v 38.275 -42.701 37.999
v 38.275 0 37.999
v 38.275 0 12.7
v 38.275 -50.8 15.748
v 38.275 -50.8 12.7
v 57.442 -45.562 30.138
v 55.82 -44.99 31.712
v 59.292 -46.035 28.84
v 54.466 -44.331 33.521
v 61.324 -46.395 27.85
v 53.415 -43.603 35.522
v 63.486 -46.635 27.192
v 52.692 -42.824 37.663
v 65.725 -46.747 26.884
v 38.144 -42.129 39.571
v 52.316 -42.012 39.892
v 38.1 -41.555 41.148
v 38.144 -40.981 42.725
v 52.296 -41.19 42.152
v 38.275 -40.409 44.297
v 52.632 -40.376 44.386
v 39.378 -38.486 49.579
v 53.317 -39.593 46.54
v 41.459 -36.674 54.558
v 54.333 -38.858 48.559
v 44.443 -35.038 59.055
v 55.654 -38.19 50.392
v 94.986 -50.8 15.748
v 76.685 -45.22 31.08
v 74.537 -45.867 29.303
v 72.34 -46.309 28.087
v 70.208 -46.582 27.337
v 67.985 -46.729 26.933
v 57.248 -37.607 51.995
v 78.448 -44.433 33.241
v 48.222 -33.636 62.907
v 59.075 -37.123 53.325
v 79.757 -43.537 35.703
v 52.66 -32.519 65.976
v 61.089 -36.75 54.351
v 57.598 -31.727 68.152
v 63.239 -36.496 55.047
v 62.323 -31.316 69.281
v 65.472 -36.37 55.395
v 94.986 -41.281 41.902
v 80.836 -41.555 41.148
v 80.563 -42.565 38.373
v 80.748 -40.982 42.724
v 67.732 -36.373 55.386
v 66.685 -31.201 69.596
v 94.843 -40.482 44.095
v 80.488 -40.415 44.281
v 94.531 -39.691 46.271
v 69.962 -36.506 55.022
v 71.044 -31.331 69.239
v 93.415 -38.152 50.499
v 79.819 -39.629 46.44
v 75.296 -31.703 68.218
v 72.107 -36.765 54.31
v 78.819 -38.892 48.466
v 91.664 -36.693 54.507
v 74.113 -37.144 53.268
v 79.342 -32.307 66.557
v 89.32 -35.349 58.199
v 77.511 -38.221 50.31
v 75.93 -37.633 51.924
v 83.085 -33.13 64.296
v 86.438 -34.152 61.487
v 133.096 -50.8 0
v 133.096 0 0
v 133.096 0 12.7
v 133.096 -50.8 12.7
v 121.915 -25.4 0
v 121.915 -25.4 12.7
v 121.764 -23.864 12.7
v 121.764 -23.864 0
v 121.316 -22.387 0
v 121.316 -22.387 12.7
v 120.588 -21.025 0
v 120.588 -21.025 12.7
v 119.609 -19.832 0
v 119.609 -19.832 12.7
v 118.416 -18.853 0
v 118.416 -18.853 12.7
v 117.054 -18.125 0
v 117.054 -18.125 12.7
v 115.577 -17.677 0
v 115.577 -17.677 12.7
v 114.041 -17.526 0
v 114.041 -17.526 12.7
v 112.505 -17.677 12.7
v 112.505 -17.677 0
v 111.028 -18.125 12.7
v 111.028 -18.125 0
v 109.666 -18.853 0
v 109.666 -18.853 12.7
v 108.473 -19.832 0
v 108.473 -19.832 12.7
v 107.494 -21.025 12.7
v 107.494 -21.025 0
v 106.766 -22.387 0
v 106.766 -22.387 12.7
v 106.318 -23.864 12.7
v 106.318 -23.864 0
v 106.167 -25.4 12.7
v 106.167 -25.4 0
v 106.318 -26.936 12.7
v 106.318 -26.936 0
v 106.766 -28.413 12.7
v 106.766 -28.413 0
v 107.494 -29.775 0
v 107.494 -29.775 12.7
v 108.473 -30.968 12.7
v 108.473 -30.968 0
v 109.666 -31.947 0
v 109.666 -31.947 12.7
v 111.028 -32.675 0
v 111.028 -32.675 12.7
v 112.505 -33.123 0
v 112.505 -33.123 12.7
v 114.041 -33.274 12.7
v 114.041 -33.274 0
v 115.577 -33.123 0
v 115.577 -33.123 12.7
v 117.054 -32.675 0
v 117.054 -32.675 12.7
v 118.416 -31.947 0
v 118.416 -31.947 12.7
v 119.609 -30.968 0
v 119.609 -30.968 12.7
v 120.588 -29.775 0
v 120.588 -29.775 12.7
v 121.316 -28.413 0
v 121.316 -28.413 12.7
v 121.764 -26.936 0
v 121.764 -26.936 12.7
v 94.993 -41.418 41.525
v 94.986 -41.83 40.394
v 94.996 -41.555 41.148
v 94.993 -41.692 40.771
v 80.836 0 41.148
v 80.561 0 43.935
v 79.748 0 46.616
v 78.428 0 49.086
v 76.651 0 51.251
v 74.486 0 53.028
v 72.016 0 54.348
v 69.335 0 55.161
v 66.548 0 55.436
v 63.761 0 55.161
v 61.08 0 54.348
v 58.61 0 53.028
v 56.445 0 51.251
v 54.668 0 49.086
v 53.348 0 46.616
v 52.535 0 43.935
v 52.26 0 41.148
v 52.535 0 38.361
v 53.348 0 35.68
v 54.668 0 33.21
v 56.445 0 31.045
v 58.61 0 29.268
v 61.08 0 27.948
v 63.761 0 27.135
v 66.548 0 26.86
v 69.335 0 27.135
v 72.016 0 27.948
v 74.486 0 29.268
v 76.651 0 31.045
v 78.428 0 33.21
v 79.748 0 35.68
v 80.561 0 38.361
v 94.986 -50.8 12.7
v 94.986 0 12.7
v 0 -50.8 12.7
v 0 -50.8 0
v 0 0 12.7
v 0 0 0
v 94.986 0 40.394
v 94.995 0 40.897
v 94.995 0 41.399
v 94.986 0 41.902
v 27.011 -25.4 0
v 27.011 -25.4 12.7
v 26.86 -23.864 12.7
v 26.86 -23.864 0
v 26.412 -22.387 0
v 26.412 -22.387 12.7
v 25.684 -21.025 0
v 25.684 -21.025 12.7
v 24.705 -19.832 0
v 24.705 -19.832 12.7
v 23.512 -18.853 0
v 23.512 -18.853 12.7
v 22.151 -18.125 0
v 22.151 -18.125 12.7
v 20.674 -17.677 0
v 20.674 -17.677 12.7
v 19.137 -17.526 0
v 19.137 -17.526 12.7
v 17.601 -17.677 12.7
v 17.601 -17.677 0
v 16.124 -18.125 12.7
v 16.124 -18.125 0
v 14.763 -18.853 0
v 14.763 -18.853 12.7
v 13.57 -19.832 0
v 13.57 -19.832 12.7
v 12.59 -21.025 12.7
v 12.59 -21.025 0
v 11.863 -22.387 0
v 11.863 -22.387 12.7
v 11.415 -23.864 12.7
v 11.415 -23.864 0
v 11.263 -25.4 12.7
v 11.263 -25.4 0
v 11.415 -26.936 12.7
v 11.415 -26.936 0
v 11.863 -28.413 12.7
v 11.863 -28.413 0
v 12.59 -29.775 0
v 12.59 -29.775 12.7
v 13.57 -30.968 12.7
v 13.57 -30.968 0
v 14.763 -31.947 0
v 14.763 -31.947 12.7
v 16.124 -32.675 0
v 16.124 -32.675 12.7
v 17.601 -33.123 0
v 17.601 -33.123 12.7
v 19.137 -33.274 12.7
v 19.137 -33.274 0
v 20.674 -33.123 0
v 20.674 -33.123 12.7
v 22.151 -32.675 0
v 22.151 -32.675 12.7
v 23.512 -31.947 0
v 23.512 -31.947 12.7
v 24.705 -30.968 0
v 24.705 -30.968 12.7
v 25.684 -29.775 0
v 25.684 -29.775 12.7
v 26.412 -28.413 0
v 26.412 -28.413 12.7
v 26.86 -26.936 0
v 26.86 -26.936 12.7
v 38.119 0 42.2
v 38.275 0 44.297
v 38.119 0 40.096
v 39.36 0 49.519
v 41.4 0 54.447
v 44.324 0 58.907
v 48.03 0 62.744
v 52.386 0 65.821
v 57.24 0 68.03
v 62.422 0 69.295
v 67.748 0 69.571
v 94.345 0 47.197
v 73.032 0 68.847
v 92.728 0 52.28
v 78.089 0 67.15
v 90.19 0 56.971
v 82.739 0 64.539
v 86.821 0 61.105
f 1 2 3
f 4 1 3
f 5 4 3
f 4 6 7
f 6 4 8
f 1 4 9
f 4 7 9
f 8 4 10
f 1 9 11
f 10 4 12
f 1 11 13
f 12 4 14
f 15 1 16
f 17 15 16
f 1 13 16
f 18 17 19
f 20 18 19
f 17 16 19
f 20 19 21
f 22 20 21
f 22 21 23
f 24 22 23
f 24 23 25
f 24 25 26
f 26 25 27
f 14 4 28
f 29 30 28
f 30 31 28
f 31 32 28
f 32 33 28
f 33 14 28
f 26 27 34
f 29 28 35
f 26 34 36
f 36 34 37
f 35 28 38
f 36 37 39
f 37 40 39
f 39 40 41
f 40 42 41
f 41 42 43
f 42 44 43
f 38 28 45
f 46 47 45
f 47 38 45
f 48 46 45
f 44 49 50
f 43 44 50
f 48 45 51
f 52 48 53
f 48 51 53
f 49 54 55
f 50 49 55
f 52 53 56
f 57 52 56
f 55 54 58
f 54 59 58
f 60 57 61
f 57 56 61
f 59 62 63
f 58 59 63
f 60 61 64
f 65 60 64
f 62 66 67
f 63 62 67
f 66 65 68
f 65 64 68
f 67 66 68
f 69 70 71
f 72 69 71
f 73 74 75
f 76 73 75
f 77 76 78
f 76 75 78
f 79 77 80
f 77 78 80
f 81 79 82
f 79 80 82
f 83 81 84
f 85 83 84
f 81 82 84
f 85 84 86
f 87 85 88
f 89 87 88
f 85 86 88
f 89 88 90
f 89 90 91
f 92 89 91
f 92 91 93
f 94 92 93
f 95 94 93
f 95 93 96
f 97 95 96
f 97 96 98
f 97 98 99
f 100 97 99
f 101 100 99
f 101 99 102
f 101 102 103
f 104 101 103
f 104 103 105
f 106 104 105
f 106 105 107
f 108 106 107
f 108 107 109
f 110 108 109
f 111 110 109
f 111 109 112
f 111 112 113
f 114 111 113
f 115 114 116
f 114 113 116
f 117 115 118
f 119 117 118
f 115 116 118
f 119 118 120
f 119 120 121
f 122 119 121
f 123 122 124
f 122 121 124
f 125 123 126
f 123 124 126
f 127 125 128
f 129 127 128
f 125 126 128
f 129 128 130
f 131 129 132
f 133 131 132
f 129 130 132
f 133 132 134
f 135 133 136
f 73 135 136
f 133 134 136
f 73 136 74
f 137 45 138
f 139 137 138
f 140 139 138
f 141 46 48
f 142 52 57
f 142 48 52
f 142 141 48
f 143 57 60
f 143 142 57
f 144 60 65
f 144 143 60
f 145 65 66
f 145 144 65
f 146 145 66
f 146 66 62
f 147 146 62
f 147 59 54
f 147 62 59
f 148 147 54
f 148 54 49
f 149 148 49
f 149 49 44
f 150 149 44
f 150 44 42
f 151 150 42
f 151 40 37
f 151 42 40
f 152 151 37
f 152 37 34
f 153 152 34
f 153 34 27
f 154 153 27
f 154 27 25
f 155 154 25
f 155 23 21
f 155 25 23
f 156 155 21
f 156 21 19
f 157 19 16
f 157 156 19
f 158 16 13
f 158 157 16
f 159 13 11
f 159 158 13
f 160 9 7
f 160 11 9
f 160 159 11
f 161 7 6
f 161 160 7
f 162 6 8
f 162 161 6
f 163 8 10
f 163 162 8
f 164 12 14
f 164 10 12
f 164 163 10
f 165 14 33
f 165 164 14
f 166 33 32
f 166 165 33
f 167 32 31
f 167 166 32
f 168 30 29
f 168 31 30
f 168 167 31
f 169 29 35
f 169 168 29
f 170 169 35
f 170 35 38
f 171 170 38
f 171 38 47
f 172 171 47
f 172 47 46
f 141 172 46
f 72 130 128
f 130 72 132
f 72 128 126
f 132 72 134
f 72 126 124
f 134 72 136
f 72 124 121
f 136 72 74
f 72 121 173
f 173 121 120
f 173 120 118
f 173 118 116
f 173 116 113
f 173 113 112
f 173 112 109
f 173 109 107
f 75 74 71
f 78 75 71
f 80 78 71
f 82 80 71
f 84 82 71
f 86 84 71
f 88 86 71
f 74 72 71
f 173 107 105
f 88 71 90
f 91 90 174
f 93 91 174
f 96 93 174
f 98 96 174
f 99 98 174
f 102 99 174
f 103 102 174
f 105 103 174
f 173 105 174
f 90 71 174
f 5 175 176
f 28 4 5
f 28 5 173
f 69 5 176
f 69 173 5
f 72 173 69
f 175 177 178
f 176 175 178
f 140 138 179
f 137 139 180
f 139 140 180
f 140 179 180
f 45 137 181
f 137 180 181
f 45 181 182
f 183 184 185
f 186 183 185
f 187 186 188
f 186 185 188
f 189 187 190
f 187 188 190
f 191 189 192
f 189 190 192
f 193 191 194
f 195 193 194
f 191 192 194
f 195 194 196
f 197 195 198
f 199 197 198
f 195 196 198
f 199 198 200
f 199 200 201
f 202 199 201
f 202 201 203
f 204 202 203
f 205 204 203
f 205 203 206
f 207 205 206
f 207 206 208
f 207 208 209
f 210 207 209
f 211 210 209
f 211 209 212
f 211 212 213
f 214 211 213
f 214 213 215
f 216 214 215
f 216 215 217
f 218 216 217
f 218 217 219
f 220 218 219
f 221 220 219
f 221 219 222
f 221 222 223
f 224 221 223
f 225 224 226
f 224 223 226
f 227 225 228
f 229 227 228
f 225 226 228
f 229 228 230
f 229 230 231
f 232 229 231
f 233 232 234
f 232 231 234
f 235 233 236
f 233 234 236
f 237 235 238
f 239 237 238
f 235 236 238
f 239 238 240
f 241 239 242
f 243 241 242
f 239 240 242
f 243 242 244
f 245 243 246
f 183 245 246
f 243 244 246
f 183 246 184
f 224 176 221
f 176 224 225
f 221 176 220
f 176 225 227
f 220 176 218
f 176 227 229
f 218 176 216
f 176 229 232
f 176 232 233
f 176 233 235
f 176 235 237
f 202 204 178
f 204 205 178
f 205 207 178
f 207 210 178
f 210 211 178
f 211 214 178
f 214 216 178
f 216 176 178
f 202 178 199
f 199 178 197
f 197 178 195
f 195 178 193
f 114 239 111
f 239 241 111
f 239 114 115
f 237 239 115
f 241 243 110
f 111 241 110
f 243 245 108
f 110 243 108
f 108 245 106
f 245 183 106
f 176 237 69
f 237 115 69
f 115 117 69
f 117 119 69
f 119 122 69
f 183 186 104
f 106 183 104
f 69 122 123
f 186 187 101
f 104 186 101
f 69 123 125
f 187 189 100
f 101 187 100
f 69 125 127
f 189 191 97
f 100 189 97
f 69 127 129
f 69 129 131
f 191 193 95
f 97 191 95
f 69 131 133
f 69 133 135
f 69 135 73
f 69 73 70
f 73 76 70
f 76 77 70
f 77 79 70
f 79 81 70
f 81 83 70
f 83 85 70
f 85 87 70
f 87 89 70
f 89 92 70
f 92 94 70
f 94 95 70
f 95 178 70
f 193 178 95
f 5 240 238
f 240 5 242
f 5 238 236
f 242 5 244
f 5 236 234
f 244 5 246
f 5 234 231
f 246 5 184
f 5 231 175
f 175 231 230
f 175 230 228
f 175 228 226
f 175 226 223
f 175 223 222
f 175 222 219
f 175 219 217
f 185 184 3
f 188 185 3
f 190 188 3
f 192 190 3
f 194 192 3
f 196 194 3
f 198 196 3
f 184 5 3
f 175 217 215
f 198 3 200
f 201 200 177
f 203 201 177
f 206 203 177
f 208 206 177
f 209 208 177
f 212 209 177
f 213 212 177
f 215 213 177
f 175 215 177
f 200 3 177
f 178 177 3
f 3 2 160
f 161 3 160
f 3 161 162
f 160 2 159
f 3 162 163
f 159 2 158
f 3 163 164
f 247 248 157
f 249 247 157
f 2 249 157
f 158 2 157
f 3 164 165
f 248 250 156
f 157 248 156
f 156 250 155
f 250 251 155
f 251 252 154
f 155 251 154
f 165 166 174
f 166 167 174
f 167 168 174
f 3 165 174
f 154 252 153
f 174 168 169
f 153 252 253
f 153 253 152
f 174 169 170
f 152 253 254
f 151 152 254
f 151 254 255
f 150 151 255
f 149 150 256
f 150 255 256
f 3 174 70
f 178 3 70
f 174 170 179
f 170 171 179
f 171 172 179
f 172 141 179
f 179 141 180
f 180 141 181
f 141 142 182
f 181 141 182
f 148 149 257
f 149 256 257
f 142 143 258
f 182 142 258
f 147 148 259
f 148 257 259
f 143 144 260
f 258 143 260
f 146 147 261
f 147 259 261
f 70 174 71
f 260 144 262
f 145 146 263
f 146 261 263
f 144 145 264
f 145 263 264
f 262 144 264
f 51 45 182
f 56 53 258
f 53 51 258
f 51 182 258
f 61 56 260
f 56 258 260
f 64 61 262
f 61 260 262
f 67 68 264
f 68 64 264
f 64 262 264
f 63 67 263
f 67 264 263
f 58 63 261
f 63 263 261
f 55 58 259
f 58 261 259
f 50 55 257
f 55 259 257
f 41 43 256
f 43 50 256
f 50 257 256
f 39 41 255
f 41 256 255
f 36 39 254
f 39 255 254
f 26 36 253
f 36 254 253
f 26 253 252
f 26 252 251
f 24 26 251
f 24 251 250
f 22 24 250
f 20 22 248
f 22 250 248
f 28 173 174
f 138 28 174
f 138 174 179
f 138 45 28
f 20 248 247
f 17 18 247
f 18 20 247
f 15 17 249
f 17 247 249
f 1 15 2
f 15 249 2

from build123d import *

# Parameters (mm, degrees)
F0_R     = 14.2875
F1_DEPTH = 50.8
F3_R     = 7.874
F2_R     = 7.874
F4_DEPTH = 25.4
F6_DEPTH = 127
F8_DEPTH = 25.4


with BuildPart() as f1:
    # F0 (on Front) → F1 (new body)
    with BuildSketch(Plane.XZ):
        Polygon((0, 12.7), (0, 0), (133.096, 0), (133.096, 12.7), (94.985996, 12.7), (94.985996, 15.748), (38.274846, 15.748), (38.274846, 12.7), align=None)
        with BuildLine():
            Line((38.274846, 37.998795), (38.274846, 15.748))
            Line((38.274846, 15.748), (94.985996, 15.748))
            Line((94.985996, 15.748), (94.985996, 40.393602))
            Line((94.985996, 40.393602), (94.985996, 41.902398))
            ThreePointArc((94.985996, 41.902398), (67.748237, 69.570669), (38.274846, 44.297205))
            Line((38.274846, 44.297205), (38.274846, 37.998795))
        make_face()
        with Locations((66.548, 41.148)):
            Circle(F0_R, mode=Mode.SUBTRACT)
        with BuildLine():
            ThreePointArc((38.274846, 44.297205), (38.1, 41.148), (38.274846, 37.998795))
            Line((38.274846, 37.998795), (38.274846, 44.297205))
        make_face()
        with BuildLine():
            Line((94.985996, 41.902398), (94.985996, 40.393602))
            ThreePointArc((94.985996, 40.393602), (94.996, 41.148), (94.985996, 41.902398))
        make_face()
    extrude(amount=F1_DEPTH)

    # F3 (on face) + F2 (on face) → F4 (cut)
    with BuildSketch(Plane.XY.offset(12.7)):
        with Locations((114.040998, -25.4)):
            Circle(F3_R)
    with BuildSketch(Plane.XY.offset(12.7)):
        with Locations((19.137423, -25.4)):
            Circle(F2_R)
    extrude(amount=-F4_DEPTH, mode=Mode.SUBTRACT)

    # F5 (on face) → F6 (cut)
    with BuildSketch(Plane.YZ.offset(94.985996)):
        Polygon((-50.8, 68.641677), (-50.8, 15.748), (-29.999232, 72.897641), (-51.085521, 72.897641), align=None)
    extrude(amount=-F6_DEPTH, mode=Mode.SUBTRACT)

    # F7 (on face) → F8 (cut)
    with BuildSketch(Plane(origin=(94.985996, 0, 0), x_dir=(0, -1, 0), z_dir=(-1, 0, 0))):
        Polygon((50.8, 40.393602), (50.8, 41.902398), (41.280578, 41.902398), (41.829734, 40.393602), align=None)
    extrude(amount=-F8_DEPTH, mode=Mode.SUBTRACT)


solid = f1.part
